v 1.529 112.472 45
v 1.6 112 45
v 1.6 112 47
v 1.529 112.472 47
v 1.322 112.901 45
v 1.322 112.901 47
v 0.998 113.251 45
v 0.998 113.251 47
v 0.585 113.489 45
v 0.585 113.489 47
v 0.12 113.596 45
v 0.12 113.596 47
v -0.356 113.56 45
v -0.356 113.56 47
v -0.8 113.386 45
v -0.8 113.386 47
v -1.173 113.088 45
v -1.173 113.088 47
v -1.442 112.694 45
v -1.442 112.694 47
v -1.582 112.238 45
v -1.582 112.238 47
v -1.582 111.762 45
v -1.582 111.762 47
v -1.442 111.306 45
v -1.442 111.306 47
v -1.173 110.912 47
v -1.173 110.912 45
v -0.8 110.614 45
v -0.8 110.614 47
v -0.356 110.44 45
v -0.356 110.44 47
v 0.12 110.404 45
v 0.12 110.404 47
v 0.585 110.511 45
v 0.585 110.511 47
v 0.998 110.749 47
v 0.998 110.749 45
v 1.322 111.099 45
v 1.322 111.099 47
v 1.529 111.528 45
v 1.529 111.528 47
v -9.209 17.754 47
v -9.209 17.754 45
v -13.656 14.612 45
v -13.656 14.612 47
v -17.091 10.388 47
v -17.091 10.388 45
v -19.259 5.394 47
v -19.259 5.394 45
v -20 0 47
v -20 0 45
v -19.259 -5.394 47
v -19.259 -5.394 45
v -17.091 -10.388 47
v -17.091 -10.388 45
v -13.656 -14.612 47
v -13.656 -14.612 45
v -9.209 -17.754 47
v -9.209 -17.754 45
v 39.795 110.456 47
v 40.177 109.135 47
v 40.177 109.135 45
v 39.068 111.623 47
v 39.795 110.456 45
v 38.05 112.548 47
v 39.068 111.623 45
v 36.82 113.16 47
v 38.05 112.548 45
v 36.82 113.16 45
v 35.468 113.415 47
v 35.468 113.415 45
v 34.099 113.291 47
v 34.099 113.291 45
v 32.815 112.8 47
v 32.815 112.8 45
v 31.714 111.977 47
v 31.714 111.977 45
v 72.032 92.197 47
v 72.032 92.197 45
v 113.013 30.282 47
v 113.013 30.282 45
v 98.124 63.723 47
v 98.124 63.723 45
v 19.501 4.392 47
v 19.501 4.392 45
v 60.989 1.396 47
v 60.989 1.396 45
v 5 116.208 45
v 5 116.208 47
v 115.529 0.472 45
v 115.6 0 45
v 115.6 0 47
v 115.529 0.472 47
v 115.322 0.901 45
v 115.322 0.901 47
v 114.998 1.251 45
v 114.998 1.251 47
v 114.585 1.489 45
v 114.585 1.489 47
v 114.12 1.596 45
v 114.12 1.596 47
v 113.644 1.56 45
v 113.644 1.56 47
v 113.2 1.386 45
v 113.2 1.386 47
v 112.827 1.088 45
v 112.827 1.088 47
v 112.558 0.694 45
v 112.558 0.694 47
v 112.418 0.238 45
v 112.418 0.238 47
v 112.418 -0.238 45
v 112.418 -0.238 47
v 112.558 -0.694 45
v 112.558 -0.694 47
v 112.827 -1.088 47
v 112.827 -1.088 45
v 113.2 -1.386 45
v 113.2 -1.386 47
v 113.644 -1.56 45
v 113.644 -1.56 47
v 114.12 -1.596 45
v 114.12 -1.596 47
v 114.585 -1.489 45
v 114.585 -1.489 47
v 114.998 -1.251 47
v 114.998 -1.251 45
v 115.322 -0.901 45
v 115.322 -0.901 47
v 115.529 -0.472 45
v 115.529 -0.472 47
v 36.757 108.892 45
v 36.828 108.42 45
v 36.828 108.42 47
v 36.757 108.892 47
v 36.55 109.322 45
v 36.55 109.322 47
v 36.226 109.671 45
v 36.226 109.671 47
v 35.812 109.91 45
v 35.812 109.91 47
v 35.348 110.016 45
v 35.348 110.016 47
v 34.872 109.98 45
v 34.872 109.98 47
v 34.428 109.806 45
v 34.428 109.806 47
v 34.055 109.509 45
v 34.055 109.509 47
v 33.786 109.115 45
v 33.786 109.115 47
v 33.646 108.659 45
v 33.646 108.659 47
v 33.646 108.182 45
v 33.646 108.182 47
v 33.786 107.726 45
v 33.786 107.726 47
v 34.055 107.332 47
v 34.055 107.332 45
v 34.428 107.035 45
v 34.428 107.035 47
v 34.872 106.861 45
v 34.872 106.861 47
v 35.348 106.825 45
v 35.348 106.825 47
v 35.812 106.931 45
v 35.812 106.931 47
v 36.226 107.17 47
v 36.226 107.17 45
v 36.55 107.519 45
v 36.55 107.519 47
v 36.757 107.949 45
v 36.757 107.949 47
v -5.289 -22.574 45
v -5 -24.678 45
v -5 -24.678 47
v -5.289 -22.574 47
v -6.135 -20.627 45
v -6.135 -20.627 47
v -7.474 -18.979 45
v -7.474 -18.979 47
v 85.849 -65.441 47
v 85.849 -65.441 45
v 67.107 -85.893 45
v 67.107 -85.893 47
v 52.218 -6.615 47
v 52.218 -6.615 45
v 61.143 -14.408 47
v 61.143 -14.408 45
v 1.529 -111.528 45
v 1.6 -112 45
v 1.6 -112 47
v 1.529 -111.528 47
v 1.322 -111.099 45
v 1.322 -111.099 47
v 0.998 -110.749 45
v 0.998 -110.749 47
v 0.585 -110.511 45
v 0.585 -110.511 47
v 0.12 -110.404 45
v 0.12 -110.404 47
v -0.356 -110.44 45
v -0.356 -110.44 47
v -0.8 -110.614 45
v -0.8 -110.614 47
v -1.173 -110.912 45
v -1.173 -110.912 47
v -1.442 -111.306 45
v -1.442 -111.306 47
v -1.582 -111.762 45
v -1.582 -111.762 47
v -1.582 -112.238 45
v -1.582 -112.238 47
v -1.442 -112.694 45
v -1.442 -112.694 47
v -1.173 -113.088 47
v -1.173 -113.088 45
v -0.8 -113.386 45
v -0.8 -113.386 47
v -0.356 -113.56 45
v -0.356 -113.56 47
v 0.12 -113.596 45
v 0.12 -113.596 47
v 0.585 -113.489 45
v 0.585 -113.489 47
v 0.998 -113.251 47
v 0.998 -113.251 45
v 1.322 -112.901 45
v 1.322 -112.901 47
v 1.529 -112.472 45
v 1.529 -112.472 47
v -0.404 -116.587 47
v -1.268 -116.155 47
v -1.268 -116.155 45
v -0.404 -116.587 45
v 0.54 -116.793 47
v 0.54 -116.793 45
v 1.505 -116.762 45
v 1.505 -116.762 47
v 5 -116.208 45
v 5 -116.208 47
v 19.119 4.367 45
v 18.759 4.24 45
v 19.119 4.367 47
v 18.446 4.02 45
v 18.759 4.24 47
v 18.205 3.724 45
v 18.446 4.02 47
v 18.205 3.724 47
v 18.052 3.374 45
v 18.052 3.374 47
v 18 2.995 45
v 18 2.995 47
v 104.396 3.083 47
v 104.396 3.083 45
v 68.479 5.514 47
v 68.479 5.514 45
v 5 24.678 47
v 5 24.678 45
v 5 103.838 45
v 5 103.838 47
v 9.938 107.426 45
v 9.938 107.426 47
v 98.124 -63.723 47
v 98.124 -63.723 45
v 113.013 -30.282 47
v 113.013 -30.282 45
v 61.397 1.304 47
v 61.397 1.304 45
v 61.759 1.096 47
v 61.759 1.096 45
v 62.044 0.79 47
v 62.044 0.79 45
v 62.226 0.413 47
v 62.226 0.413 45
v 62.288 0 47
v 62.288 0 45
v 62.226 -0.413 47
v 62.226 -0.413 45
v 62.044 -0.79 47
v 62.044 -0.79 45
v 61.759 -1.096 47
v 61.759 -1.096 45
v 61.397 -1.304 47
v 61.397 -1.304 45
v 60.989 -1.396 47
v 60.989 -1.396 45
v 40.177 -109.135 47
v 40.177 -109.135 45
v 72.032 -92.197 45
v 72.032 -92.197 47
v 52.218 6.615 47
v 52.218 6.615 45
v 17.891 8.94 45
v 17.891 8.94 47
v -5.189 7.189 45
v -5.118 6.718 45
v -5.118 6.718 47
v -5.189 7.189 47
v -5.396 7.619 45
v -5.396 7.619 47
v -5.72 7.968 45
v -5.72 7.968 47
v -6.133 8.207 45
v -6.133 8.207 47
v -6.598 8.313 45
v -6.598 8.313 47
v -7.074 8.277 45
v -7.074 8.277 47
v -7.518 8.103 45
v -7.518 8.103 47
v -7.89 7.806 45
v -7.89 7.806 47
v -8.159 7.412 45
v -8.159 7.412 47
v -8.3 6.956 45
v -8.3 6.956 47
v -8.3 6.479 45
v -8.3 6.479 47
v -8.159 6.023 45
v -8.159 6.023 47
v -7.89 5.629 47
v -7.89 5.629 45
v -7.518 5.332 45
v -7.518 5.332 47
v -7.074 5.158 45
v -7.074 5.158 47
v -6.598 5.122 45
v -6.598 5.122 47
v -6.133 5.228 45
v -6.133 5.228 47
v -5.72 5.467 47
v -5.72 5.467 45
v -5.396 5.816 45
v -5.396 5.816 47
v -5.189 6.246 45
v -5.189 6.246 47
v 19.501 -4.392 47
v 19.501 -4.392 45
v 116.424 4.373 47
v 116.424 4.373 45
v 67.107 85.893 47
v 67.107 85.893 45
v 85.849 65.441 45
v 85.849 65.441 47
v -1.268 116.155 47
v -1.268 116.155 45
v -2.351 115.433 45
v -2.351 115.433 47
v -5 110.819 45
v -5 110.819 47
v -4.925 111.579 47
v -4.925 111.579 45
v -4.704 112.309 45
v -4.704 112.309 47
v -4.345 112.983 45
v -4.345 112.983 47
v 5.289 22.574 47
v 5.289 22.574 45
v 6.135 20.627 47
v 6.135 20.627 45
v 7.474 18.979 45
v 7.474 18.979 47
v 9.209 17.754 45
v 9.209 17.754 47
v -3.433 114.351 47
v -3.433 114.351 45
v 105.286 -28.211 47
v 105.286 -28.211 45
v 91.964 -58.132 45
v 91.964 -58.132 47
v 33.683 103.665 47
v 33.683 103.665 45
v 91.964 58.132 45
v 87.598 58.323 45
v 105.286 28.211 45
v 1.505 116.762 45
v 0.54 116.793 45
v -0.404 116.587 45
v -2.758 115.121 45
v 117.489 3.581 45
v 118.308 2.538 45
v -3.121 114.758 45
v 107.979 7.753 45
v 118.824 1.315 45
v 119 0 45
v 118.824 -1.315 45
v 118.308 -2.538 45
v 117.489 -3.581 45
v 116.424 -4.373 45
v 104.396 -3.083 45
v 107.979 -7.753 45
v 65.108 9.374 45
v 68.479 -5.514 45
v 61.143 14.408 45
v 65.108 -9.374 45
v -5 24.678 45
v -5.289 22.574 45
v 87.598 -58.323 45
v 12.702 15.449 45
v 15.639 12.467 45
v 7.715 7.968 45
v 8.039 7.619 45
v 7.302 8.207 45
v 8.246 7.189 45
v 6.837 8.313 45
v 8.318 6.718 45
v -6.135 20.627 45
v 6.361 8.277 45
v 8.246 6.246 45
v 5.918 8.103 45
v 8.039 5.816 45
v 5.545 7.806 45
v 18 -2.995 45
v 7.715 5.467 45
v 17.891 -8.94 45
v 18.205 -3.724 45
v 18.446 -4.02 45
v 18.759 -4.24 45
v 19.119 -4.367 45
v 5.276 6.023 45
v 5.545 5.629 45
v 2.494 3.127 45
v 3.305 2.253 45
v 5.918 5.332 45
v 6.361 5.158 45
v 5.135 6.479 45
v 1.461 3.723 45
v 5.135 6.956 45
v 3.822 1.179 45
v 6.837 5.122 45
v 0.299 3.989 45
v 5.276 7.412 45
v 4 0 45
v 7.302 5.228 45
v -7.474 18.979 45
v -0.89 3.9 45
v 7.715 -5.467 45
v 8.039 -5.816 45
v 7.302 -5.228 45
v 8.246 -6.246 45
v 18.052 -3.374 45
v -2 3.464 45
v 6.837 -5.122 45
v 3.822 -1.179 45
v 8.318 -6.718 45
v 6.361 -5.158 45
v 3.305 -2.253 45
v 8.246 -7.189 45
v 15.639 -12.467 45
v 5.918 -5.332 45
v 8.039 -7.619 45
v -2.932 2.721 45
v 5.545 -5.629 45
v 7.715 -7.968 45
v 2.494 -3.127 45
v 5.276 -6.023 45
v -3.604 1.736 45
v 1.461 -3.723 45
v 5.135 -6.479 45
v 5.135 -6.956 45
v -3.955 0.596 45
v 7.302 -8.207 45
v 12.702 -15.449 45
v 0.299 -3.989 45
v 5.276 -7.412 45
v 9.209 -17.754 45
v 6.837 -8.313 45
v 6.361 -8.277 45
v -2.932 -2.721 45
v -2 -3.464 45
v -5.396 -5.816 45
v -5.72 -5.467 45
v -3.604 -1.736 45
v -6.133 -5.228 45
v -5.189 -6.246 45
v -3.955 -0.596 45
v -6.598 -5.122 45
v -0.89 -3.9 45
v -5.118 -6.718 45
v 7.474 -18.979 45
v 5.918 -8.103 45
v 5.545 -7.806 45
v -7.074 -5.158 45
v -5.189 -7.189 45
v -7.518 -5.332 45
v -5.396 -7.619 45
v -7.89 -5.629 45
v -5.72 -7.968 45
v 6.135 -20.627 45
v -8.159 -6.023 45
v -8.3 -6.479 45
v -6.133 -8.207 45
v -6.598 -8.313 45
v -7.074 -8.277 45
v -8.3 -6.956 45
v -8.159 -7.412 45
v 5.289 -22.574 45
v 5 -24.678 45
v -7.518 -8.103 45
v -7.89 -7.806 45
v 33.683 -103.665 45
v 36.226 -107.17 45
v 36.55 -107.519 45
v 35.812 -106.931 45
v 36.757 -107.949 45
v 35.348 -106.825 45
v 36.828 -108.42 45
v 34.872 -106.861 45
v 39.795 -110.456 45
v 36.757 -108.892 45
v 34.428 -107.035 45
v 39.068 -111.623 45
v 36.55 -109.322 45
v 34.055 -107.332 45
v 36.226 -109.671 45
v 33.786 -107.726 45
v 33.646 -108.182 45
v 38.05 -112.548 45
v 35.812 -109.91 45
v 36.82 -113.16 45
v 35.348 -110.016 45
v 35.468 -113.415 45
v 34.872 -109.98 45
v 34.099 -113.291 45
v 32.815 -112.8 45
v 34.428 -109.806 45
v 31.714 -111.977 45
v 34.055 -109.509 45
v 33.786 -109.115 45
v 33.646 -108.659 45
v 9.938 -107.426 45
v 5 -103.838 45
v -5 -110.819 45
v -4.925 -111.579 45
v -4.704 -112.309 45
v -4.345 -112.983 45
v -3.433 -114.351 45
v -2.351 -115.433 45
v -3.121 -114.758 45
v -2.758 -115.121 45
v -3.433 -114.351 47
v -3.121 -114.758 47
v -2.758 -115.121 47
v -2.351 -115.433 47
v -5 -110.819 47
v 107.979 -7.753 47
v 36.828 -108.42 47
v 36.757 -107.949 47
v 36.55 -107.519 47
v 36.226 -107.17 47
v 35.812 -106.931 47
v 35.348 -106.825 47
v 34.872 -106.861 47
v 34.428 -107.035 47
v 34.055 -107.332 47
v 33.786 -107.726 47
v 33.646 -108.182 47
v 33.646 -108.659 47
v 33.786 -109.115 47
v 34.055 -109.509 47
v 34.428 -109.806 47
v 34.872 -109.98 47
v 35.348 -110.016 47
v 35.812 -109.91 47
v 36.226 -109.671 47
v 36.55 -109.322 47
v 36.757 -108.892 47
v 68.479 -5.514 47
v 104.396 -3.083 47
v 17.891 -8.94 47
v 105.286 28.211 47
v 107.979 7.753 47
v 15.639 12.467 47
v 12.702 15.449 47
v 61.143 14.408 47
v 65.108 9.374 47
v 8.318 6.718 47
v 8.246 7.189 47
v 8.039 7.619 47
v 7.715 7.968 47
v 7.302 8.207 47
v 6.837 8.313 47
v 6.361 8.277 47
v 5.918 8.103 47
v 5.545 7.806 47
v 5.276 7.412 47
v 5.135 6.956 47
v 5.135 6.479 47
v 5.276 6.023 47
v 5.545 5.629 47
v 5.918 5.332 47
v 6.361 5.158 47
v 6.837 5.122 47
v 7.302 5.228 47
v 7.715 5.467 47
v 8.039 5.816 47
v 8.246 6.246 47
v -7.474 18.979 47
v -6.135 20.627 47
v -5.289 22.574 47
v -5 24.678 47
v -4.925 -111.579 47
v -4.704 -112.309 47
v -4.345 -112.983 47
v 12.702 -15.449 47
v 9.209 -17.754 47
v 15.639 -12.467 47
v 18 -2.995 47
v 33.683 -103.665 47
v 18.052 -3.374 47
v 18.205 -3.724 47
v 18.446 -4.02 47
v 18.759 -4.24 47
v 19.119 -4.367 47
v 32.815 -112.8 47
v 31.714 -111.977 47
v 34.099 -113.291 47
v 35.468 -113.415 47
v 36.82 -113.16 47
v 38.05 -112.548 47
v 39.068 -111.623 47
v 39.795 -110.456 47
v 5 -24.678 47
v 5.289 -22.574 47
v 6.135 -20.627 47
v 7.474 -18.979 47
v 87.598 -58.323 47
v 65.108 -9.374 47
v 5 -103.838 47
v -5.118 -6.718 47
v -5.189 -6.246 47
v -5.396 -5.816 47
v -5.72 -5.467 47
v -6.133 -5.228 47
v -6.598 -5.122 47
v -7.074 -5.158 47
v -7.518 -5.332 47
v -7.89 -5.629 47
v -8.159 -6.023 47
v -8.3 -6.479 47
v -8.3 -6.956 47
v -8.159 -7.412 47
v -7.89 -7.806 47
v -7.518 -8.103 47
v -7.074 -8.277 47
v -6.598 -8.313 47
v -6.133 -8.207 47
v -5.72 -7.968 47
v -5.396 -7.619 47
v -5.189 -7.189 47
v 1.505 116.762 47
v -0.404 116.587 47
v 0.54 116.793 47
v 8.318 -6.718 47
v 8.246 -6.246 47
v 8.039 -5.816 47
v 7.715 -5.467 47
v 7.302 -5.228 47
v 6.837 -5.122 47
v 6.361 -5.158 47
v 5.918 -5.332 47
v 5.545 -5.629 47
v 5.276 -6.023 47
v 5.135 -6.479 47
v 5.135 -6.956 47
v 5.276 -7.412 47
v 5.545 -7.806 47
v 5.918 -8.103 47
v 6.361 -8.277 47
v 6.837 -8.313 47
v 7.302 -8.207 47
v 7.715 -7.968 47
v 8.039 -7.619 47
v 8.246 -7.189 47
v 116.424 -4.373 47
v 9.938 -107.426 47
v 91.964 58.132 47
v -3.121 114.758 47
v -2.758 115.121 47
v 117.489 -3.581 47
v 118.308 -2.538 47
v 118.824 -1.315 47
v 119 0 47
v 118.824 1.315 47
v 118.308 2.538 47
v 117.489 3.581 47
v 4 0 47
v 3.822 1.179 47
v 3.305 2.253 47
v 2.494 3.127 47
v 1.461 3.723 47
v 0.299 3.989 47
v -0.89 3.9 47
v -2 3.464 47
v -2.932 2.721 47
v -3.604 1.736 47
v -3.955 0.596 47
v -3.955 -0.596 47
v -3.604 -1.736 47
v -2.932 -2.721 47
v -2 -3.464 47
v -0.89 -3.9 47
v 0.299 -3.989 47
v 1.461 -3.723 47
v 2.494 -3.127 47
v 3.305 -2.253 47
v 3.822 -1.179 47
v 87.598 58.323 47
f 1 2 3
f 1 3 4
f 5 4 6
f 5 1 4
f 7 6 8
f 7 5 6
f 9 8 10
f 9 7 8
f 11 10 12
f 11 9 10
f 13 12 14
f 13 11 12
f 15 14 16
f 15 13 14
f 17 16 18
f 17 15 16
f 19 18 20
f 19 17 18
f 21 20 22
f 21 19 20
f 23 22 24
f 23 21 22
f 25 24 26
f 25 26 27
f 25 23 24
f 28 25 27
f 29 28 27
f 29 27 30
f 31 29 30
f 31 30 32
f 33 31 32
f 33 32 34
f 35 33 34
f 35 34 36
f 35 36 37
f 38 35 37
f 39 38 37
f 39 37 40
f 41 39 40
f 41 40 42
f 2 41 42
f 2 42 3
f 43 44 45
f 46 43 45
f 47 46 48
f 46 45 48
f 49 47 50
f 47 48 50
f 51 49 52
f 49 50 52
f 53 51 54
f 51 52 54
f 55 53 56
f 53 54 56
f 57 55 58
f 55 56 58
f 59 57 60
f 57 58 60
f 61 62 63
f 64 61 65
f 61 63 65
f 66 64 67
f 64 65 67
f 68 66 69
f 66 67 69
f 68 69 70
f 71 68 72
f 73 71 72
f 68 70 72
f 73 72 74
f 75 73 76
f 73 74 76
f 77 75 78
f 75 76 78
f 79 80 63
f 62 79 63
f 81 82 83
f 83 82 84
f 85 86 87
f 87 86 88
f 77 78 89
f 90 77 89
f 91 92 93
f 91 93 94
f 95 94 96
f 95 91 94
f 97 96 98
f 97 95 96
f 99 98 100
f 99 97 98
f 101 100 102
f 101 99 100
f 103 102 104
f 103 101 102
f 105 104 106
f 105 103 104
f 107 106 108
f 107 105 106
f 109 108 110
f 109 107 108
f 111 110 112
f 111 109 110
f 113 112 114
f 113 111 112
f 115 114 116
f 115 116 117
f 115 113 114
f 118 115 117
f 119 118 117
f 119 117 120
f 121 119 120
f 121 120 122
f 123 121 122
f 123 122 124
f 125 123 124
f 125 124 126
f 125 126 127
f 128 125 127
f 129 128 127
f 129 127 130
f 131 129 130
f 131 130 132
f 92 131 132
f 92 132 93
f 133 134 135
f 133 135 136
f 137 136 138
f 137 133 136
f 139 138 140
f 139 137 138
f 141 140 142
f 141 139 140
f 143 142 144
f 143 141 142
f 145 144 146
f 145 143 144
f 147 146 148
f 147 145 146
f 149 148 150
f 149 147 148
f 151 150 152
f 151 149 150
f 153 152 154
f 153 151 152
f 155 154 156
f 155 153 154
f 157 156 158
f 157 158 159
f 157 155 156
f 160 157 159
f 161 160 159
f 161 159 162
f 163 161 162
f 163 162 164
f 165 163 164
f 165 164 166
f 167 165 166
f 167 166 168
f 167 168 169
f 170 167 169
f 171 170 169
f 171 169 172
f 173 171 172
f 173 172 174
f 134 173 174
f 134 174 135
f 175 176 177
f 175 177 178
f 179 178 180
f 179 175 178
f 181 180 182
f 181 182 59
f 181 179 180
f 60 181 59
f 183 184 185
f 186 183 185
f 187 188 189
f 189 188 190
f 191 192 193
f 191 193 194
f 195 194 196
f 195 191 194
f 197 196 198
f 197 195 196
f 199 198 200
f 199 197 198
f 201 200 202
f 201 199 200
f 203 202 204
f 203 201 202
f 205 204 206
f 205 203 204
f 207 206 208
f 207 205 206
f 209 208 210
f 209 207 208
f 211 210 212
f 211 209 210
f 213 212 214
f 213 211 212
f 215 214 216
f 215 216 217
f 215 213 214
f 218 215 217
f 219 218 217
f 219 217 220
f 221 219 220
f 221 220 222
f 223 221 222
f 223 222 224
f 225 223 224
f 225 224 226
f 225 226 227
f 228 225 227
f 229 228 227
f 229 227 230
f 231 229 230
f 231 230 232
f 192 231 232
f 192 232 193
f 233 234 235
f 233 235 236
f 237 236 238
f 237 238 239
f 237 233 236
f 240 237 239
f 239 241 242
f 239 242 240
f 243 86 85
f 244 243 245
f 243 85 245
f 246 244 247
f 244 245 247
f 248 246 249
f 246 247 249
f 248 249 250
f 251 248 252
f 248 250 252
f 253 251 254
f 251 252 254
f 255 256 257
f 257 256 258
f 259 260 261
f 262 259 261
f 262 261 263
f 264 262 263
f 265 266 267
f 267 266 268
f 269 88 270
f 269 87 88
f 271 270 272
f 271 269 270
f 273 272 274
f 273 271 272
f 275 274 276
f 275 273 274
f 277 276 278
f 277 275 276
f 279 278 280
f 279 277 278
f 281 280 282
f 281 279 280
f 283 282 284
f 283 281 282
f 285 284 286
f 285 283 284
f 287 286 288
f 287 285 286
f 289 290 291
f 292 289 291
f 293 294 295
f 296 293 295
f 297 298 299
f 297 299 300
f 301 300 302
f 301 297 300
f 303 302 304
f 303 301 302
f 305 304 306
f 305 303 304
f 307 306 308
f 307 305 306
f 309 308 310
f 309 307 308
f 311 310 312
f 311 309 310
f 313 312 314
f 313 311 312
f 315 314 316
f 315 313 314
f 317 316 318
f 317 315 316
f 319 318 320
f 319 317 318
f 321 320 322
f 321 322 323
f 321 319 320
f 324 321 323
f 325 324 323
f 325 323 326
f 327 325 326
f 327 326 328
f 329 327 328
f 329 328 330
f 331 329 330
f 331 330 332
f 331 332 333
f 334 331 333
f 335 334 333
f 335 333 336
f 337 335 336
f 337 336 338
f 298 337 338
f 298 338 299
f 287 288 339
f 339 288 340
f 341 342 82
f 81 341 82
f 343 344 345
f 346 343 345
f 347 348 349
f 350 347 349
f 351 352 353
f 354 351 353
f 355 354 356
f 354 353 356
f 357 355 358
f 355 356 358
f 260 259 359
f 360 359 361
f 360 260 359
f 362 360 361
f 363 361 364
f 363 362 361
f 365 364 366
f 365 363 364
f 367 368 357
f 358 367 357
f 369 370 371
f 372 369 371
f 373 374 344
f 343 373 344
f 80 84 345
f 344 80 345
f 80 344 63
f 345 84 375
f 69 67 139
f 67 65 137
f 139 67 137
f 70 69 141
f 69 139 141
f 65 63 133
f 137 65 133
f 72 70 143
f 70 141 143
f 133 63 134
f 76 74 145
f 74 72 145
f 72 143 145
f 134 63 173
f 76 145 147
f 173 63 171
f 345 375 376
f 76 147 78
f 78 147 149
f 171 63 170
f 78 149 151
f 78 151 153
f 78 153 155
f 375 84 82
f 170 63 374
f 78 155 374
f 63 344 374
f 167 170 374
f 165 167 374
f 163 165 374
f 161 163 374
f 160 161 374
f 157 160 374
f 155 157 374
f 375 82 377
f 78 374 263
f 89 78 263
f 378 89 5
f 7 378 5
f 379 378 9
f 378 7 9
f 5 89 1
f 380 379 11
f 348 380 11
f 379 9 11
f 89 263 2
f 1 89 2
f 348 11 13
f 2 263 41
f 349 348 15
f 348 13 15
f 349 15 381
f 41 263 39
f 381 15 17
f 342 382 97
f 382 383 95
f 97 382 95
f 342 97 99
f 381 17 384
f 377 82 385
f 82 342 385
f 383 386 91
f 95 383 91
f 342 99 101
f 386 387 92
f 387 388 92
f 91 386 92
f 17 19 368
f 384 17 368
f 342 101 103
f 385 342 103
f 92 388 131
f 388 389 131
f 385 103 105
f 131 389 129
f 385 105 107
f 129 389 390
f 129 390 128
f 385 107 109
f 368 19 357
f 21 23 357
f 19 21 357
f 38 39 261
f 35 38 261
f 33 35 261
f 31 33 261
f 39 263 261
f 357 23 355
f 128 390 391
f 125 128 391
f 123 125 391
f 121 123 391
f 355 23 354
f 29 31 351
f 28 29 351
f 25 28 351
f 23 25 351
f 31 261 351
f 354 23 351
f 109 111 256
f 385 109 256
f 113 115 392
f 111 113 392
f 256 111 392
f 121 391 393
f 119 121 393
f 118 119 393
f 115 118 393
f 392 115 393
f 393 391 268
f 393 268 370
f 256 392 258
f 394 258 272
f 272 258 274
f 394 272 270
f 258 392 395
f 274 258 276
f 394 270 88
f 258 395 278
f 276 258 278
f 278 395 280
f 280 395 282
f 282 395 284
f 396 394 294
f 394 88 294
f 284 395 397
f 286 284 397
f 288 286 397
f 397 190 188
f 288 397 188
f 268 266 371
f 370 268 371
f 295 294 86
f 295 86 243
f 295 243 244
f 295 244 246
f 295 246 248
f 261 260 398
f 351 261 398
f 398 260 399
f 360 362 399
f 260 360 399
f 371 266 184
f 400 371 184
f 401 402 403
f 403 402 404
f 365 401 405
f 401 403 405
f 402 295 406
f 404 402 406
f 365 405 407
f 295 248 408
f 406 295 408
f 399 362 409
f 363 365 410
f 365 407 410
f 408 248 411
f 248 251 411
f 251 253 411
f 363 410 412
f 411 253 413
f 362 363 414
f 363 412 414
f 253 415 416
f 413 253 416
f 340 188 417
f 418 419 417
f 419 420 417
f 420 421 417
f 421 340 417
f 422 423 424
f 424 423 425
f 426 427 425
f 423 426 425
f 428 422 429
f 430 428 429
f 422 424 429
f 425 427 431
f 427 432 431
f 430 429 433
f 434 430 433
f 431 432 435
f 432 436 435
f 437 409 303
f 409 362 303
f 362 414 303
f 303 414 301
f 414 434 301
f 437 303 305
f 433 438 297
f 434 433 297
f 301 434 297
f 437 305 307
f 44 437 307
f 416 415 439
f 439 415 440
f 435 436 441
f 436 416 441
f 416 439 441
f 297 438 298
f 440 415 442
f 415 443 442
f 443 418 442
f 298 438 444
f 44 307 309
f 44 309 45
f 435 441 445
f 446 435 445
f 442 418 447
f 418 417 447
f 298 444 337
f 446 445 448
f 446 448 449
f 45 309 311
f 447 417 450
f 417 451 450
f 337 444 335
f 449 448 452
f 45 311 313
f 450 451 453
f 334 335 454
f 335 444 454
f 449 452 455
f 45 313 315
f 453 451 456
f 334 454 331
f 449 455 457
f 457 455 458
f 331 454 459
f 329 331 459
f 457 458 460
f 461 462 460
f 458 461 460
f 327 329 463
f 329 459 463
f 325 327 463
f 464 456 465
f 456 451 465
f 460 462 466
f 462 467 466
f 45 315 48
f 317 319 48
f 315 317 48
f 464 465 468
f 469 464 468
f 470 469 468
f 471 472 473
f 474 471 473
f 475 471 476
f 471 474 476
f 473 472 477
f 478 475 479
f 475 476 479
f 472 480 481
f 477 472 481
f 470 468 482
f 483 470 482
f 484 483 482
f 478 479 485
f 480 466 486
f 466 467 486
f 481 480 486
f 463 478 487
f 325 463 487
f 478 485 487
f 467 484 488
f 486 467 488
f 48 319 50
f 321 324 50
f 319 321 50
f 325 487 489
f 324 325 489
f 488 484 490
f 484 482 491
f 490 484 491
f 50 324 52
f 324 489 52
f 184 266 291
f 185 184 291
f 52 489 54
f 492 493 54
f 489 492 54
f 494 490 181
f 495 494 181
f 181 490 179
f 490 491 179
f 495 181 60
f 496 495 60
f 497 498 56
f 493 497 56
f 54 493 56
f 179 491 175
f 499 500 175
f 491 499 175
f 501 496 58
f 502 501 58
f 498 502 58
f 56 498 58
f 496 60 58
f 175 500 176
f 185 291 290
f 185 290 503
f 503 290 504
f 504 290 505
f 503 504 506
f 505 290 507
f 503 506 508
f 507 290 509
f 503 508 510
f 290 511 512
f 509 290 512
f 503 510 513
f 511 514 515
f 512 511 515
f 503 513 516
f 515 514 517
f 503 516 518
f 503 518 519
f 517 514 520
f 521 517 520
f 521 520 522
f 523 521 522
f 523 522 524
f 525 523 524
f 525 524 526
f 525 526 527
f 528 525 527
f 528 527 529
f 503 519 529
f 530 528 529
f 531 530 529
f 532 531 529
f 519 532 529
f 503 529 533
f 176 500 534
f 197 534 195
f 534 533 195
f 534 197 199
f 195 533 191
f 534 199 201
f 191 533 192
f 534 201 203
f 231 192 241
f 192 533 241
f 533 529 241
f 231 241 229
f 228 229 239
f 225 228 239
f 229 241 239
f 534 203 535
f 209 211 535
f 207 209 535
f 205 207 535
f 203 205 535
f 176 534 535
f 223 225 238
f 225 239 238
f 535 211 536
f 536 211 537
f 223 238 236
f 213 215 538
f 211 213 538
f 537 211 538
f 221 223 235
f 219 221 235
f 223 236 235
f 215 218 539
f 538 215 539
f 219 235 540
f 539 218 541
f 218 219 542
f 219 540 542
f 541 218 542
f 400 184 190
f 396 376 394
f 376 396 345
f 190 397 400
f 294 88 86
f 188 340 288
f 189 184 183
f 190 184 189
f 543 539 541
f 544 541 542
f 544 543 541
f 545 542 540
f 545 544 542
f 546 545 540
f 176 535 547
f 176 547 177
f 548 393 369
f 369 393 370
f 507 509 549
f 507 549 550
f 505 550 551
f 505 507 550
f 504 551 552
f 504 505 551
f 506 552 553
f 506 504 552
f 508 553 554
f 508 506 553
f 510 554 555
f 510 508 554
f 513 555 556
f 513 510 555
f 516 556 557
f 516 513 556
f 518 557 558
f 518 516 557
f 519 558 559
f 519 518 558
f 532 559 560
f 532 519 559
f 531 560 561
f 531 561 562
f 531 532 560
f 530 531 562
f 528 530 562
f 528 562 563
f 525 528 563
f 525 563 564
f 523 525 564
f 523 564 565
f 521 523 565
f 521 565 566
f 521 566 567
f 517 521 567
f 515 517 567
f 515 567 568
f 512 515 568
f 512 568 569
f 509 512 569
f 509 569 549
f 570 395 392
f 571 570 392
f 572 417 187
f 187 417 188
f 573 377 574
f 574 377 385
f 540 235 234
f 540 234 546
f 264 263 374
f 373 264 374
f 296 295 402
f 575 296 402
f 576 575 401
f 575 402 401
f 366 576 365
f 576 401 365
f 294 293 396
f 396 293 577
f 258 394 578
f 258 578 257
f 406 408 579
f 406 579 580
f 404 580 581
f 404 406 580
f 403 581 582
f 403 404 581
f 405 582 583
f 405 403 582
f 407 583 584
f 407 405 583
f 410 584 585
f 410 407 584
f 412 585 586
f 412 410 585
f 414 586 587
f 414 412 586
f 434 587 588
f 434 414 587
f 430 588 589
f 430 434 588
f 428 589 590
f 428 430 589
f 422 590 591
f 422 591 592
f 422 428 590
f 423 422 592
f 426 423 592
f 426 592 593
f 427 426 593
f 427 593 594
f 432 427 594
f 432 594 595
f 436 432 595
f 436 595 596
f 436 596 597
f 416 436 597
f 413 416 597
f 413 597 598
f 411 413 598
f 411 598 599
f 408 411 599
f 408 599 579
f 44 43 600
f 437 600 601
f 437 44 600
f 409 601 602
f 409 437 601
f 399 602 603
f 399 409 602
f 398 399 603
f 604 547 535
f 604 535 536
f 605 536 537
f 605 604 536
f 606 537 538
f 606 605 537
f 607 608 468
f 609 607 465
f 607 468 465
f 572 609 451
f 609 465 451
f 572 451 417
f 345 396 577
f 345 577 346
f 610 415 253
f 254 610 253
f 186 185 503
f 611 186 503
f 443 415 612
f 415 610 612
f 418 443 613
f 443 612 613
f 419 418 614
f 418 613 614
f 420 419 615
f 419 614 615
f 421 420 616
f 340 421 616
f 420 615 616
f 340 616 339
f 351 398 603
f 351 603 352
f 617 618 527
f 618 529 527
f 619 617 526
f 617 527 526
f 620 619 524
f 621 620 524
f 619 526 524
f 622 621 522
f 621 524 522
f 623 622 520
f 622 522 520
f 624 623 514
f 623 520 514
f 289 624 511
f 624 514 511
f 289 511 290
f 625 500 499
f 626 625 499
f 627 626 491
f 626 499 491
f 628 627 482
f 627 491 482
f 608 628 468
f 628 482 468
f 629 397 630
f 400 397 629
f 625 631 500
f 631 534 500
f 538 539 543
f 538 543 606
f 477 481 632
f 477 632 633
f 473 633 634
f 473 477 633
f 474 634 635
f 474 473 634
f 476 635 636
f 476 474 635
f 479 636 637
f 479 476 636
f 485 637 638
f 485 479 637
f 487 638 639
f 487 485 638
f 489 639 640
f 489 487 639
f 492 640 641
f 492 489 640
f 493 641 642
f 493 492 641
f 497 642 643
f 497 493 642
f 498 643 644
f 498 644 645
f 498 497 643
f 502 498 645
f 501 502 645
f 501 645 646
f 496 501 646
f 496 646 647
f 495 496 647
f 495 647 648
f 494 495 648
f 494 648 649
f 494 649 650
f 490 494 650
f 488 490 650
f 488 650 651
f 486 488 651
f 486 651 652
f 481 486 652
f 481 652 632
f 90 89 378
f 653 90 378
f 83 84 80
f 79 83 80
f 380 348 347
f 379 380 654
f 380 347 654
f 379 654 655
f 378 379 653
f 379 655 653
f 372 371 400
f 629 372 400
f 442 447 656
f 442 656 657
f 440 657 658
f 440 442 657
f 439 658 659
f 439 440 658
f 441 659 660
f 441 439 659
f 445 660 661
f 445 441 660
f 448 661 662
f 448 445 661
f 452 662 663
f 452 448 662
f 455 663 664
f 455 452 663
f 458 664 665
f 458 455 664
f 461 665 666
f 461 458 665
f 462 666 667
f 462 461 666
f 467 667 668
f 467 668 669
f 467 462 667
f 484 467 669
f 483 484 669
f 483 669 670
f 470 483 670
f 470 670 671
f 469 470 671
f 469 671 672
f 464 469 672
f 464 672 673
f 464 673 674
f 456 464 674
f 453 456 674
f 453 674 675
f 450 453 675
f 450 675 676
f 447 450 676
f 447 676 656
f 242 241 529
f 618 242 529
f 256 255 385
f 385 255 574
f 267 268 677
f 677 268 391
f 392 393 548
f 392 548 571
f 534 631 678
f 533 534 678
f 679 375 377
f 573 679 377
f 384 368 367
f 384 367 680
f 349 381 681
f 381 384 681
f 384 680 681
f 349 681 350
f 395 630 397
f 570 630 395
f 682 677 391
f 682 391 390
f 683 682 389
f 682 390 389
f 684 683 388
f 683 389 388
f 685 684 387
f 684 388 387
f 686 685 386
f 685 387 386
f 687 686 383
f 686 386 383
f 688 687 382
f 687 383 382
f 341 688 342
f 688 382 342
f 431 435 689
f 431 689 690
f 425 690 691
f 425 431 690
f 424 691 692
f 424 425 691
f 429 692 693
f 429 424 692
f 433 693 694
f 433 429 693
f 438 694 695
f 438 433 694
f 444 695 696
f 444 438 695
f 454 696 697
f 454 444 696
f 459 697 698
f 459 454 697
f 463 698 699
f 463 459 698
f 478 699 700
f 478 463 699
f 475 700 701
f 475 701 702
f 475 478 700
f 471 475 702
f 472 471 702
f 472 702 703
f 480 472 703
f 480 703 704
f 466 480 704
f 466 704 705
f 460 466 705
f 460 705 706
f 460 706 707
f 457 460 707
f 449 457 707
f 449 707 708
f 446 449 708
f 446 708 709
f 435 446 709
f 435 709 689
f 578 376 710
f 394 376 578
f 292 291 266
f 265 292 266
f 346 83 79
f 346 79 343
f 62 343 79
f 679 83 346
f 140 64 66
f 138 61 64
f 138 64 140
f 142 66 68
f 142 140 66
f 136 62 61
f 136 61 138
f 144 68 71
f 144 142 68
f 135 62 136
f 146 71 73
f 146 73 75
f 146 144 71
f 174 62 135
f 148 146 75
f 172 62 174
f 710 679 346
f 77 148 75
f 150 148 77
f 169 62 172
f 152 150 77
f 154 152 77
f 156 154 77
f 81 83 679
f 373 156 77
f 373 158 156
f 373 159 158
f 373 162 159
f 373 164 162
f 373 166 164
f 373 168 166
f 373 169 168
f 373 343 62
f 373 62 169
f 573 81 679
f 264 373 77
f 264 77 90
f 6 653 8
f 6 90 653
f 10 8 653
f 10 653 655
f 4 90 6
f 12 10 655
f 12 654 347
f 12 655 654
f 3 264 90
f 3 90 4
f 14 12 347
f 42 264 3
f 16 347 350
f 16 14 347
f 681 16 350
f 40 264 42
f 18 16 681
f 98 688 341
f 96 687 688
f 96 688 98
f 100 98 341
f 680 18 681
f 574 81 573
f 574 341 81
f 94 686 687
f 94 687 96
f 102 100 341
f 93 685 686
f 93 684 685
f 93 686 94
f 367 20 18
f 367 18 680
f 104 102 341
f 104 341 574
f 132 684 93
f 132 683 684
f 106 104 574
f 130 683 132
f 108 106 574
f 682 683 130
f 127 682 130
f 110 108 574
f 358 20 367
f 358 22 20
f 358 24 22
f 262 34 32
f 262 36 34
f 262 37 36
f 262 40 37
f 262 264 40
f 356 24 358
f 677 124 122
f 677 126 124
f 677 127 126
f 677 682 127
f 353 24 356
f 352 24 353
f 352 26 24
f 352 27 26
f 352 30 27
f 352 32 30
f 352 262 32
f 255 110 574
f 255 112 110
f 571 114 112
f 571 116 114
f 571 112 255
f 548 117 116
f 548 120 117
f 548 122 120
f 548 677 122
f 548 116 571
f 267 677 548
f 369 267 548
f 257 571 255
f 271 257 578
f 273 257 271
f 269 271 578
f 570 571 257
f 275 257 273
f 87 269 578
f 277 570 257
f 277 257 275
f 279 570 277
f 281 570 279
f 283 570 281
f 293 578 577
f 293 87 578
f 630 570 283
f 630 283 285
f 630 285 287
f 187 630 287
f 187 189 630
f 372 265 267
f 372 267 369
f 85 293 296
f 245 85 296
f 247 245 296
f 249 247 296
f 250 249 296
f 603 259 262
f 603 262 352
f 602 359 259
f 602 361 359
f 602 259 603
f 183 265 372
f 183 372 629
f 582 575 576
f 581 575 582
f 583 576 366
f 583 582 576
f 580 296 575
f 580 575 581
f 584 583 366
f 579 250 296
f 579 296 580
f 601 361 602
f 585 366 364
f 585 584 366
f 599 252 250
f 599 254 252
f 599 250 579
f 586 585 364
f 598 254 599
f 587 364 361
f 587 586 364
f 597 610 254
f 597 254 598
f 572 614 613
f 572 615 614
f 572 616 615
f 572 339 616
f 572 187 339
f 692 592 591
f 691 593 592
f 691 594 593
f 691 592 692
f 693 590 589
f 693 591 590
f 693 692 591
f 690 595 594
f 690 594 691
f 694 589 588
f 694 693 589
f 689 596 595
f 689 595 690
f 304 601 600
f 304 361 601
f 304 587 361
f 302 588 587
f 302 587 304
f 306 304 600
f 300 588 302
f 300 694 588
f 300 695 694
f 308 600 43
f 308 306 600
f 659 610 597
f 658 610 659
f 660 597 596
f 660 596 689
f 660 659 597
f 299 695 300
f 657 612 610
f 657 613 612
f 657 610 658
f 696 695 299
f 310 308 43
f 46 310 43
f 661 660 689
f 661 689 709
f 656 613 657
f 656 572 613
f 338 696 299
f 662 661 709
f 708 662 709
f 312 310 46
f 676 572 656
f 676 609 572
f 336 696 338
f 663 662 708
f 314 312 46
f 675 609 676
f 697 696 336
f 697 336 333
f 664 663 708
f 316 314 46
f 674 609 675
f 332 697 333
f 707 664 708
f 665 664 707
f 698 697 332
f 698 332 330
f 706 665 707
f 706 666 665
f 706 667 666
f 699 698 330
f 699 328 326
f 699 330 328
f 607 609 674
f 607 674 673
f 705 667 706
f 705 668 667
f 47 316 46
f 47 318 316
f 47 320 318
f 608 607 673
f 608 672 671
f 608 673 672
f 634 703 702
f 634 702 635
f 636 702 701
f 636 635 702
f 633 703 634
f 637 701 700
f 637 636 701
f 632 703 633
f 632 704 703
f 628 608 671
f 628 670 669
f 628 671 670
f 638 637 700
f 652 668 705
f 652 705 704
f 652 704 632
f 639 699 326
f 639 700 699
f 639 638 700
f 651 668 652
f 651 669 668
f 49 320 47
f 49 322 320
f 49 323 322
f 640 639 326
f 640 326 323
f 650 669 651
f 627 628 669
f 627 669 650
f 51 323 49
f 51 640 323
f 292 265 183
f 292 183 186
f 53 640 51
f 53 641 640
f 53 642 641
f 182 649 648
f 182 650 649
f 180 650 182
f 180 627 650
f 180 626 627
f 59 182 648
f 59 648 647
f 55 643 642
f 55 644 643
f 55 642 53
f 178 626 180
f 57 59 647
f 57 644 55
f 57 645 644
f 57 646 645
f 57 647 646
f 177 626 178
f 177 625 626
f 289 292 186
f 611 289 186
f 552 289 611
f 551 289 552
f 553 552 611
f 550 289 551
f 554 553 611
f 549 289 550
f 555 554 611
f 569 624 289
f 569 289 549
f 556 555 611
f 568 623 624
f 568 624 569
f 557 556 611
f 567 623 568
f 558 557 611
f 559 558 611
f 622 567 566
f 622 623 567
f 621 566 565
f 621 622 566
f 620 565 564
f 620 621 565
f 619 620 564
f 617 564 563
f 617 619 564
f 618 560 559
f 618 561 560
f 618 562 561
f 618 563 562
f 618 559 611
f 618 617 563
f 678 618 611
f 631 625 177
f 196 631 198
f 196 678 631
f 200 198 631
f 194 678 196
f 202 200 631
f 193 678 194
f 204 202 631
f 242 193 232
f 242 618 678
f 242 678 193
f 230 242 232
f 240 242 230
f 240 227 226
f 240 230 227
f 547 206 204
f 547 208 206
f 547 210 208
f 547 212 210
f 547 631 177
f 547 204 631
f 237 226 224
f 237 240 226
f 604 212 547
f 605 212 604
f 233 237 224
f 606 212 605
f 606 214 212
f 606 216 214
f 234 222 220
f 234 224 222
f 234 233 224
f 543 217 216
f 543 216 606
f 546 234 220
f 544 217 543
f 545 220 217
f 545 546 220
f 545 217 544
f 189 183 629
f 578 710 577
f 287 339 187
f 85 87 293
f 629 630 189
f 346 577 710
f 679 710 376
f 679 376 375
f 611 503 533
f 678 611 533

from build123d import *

# Parameters (mm, degrees)
EXTRUDE_180_DEPTH      = 8
EXTRUDE_START          = 8
SKETCH_2_W             = 6
SKETCH_2_H             = 4
EXTRUDE_456_DEPTH      = 36
EXTRUDE_START_2        = 44
EXTRUDE_180_2_DEPTH    = 3
SKETCH_4_R             = 20
SKETCH_4_R_2           = 4
EXTRUDE_691_DEPTH      = 3
EXTRUDE_744_DEPTH      = 3
SKETCH_6_W             = 10
SKETCH_6_H             = 96
EXTRUDE_1_DEPTH        = 3
EXTRUDE_Y_1_DEPTH      = 3
SKETCH_8_W             = 10
SKETCH_8_H             = 96
EXTRUDE_1_2_DEPTH      = 3
EXTRUDE_Y_1_2_DEPTH    = 3
CUT_EXTRUDE_START      = 44
CUT_EXTRUDE_1136_DEPTH = 3
EXTRUDE_1227_DEPTH     = 3
SKETCH_12_R            = 5
EXTRUDE_1296_DEPTH     = 8
SKETCH_13_R            = 1.6
CUT_EXTRUDE_1367_DEPTH = 3
SKETCH_14_R            = 1.6
CUT_EXTRUDE_1428_DEPTH = 8
SKETCH_15_W            = 600
SKETCH_15_H            = 600
CUT_EXTRUDE_1488_DEPTH = 44
F_2MM_START            = 44
F_2MM_DEPTH            = 3
SKETCH_17_R            = 5
EXTRUDE_M3_DEPTH       = 3
SKETCH_18_R            = 5
EXTRUDE_3_DEPTH        = 3
SKETCH_19_R            = 5
EXTRUDE_4_DEPTH        = 3
SKETCH_20_R            = 1.6
CUT_EXTRUDE_M3_DEPTH   = 3
R7P8_75_R              = 7.8
R3P9_R                 = 3.9
F_2MM_45_47_START      = 44
SKETCH_21_W            = 600
SKETCH_21_H            = 600
F_2MM_45_47_DEPTH      = 1
FILLET_1_R             = 1.4
CHAMFER_1_SIZE         = 5
CHAMFER_1_SIZE_2       = 4.246045496
CHAMFER_1_SIZE_3       = 3.817956769
CHAMFER_1_SIZE_4       = 4.370160244
CHAMFER_1_SIZE_5       = 3.876090347
CHAMFER_1_SIZE_6       = 9.033398393


with BuildPart() as part:
    # 草图1 → Extrude 180 (new body)
    with BuildSketch(Plane.XY):
        Polygon((0, -115), (35.536954353, -109.371499374), (70.801069662, -90.621236665), (96.447115314, -62.633489027), (111.081470023, -29.764190187), (115, 0), (111.081470023, 29.764190187), (96.447115314, 62.633489027), (70.801069662, 90.621236665), (35.536954353, 109.371499374), (0, 115), (0, 111), (34.300886376, 105.567273309), (68.338423761, 87.46919365), (93.092433042, 60.454932887), (107.217766718, 28.728914006), (111, 0), (107.217766718, -28.728914006), (93.092433042, -60.454932887), (68.338423761, -87.46919365), (34.300886376, -105.567273309), (0, -111), align=None)
    extrude(amount=EXTRUDE_180_DEPTH)

    # 草图2 → Extrude 456 (add)
    with BuildSketch(Plane.XY.offset(EXTRUDE_START)):
        Polygon((35.584965419, -103.047126287), (37.439067386, -108.753465385), (33.634841321, -109.989533363), (31.780739354, -104.283194265), align=None)
        with Locations((112, 0)):
            Rectangle(SKETCH_2_W, SKETCH_2_H)
        Polygon((31.780739354, 104.283194265), (33.634841321, 109.989533363), (37.439067386, 108.753465385), (35.584965419, 103.047126287), align=None)
    extrude(amount=EXTRUDE_456_DEPTH)

    # 草图3 → Extrude 180 2 (add)
    with BuildSketch(Plane.XY.offset(EXTRUDE_START_2)):
        Polygon((0, -115), (35.536954353, -109.371499374), (70.801069662, -90.621236665), (96.447115314, -62.633489027), (111.081470023, -29.764190187), (115, 0), (111.081470023, 29.764190187), (96.447115314, 62.633489027), (70.801069662, 90.621236665), (35.536954353, 109.371499374), (0, 115), (0, 109), (33.682852387, 103.665160276), (67.10710081, 85.893172143), (91.415091906, 59.365654817), (105.285915066, 28.211275916), (109, 0), (105.285915066, -28.211275916), (91.415091906, -59.365654817), (67.10710081, -85.893172143), (33.682852387, -103.665160276), (0, -109), align=None)
    extrude(amount=EXTRUDE_180_2_DEPTH)



with BuildPart() as body_2:
    # 草图4 → Extrude 691 (new body)
    with BuildSketch(Plane.XY.offset(EXTRUDE_START_2)):
        Circle(SKETCH_4_R)
        Circle(SKETCH_4_R_2, mode=Mode.SUBTRACT)
    extrude(amount=EXTRUDE_691_DEPTH)


with BuildPart() as part_1:
    add(part.part)

    add(body_2.part)  # Extrude 744 merges body 2
    # 草图5 → Extrude 744 (add)
    with BuildSketch(Plane.XY.offset(EXTRUDE_START_2)):
        Polygon((17, -9), (113, -2.5), (113, 2.5), (17, 9), align=None)
    extrude(amount=EXTRUDE_744_DEPTH)

    # 草图6 → Extrude 1 (add)
    with BuildSketch(Plane.XY.offset(EXTRUDE_START_2)):
        with Locations((0, -64)):
            Rectangle(SKETCH_6_W, SKETCH_6_H)
    extrude(amount=EXTRUDE_1_DEPTH)

    # 草图7 → Extrude Y__-1 (add)
    with BuildSketch(Plane.XY.offset(EXTRUDE_START_2)):
        Polygon((60.213265383, 1.279918343), (91.234949037, -66.240061243), (87.165050963, -68.159938757), (54.786734617, -1.279918343), align=None)
    extrude(amount=EXTRUDE_Y_1_DEPTH)

    # 草图8 → Extrude 1 2 (add)
    with BuildSketch(Plane.XY.offset(EXTRUDE_START_2)):
        with Locations((0, 64)):
            Rectangle(SKETCH_8_W, SKETCH_8_H)
    extrude(amount=EXTRUDE_1_2_DEPTH)

    # 草图9 → Extrude Y__1 2 (add)
    with BuildSketch(Plane.XY.offset(EXTRUDE_START_2)):
        Polygon((54.786734617, 1.279918343), (87.165050963, 68.159938757), (91.234949037, 66.240061243), (60.213265383, -1.279918343), align=None)
    extrude(amount=EXTRUDE_Y_1_2_DEPTH)

    # 草图10 → Cut-Extrude 1136 (cut)
    with BuildSketch(Plane.XY.offset(CUT_EXTRUDE_START)):
        Polygon((18, -4.5), (18, 4.5), (80.33, 0), align=None)
    extrude(amount=CUT_EXTRUDE_1136_DEPTH, mode=Mode.SUBTRACT)

    # 草图11 → Extrude 1227 (add)
    with BuildSketch(Plane.XY.offset(EXTRUDE_START_2)):
        Polygon((-5, -107), (5, -107), (5, -116.208077798), (0, -117), (-3, -115), (-5, -112), align=None)
        Polygon((-5, 107), (5, 107), (5, 116.208077798), (0, 117), (-3, 115), (-5, 112), align=None)
    extrude(amount=EXTRUDE_1227_DEPTH)

    # 草图12 → Extrude 1296 (add)
    with BuildSketch(Plane.XY):
        with Locations((0, 112)):
            Circle(SKETCH_12_R)
        with Locations((0, -112)):
            Circle(SKETCH_12_R)
    extrude(amount=EXTRUDE_1296_DEPTH)

    # 草图13 → Cut-Extrude 1367 (cut)
    with BuildSketch(Plane.XY.offset(CUT_EXTRUDE_START)):
        with Locations((0, 112)):
            Circle(SKETCH_13_R)
        with Locations((0, -112)):
            Circle(SKETCH_13_R)
        with Locations((-6.717514421, -6.717514421)):
            Circle(SKETCH_13_R)
        with Locations((-6.717514421, 6.717514421)):
            Circle(SKETCH_13_R)
        with Locations((6.717514421, -6.717514421)):
            Circle(SKETCH_13_R)
        with Locations((6.717514421, 6.717514421)):
            Circle(SKETCH_13_R)
    extrude(amount=CUT_EXTRUDE_1367_DEPTH, mode=Mode.SUBTRACT)

    # 草图14 → Cut-Extrude 1428 (cut)
    with BuildSketch(Plane.XY):
        with Locations((0, 112)):
            Circle(SKETCH_14_R)
        with Locations((0, -112)):
            Circle(SKETCH_14_R)
    extrude(amount=CUT_EXTRUDE_1428_DEPTH, mode=Mode.SUBTRACT)

    # 草图15 → Cut-Extrude 1488 (cut)
    with BuildSketch(Plane.XY):
        Rectangle(SKETCH_15_W, SKETCH_15_H)
    extrude(amount=CUT_EXTRUDE_1488_DEPTH, mode=Mode.SUBTRACT)

    # 草图16 → 外圈径向加厚2mm (add)
    with BuildSketch(Plane.XY.offset(F_2MM_START)):
        Polygon((0, -117), (36.154988342, -111.273612407), (72.032392613, -92.197258172), (98.12445645, -63.722767097), (113.013321676, -30.281828277), (117, 0), (113.013321676, 30.281828277), (98.12445645, 63.722767097), (72.032392613, 92.197258172), (36.154988342, 111.273612407), (0, 117), (0, 114), (35.227937359, 108.420442858), (70.185408187, 89.833225911), (95.608444746, 62.088849992), (110.115544197, 29.505371142), (114, 0), (110.115544197, -29.505371142), (95.608444746, -62.088849992), (70.185408187, -89.833225911), (35.227937359, -108.420442858), (0, -114), align=None)
    extrude(amount=F_2MM_DEPTH)

    # 草图17 → M3铝柱上定位耳 (add)
    with BuildSketch(Plane.XY.offset(EXTRUDE_START_2)):
        with Locations((35.227937359, -108.420442858)):
            Circle(SKETCH_17_R)
    extrude(amount=EXTRUDE_M3_DEPTH)

    # 草图18 → 凸台-拉伸3 (add)
    with BuildSketch(Plane.XY.offset(EXTRUDE_START_2)):
        with Locations((114, 0)):
            Circle(SKETCH_18_R)
    extrude(amount=EXTRUDE_3_DEPTH)

    # 草图19 → 凸台-拉伸4 (add)
    with BuildSketch(Plane.XY.offset(EXTRUDE_START_2)):
        with Locations((35.227937359, 108.420442858)):
            Circle(SKETCH_19_R)
    extrude(amount=EXTRUDE_4_DEPTH)

    # 草图20 → 三处M3上层固定孔 (cut)
    with BuildSketch(Plane.XY.offset(CUT_EXTRUDE_START)):
        with Locations((35.227937359, -108.420442858)):
            Circle(SKETCH_20_R)
        with Locations((114, 0)):
            Circle(SKETCH_20_R)
        with Locations((35.227937359, 108.420442858)):
            Circle(SKETCH_20_R)
    extrude(amount=CUT_EXTRUDE_M3_DEPTH, mode=Mode.SUBTRACT)

    # 外侧梁根部圆角_R7p8_参考75度桨保
    r7p8_75_edges = [part_1.edges().sort_by_distance(p)[0] for p in [
        (5, -19.364916731, 45.5),
        (-5, -19.364916731, 45.5),
        (-5, 19.364916731, 45.5),
        (5, 19.364916731, 45.5),
    ]]
    fillet(r7p8_75_edges, radius=R7P8_75_R)

    # 端耳外缘圆角_R3p9_轮廓内收
    r3p9_edges = [part_1.edges().sort_by_distance(p)[0] for p in [
        (-5, -112, 45.5),
        (-5, 112, 45.5),
        (-3, -115, 45.5),
        (0, -117, 45.5),
        (0, 117, 45.5),
        (-3, 115, 45.5),
    ]]
    fillet(r3p9_edges, radius=R3P9_R)

    # 草图21 → 统一2mm板厚_上层保留45至47 (cut)
    with BuildSketch(Plane.XY.offset(F_2MM_45_47_START)):
        Rectangle(SKETCH_21_W, SKETCH_21_H)
    extrude(amount=F_2MM_45_47_DEPTH, mode=Mode.SUBTRACT)

    # 圆角1
    fillet_1_edges = [part_1.edges().sort_by_distance(p)[0] for p in [
        (18, -4.5, 46),
        (80.33, 0, 46),
        (18, 4.5, 46),
    ]]
    fillet(fillet_1_edges, radius=FILLET_1_R)

    # 倒角1
    # the kernel refuses this chamfer: 9.033398393, 5, 4.370160244, 4.246045496, 3.876090347, 3.817956769 mm, written as the material it adds along each edge
    with BuildSketch(Plane(origin=(108.631931923, -2.795754609, 45), x_dir=(-0.10321619689960815, -0.9946589449140752, 0), z_dir=(0, 0, 1))) as chamfer_1_piece_1:
        Polygon((CHAMFER_1_SIZE * 0.999621916911, -CHAMFER_1_SIZE * 0.0274958766106), (CHAMFER_1_SIZE_2 * 0.17017326961, -CHAMFER_1_SIZE_2 * 0.985414155772), (0, 0), align=None)
    extrude(amount=2)
    with BuildSketch(Plane(origin=(108.631931923, 2.795754609, 47), x_dir=(-0.9995678495067102, 0.02939581998398161, 0), z_dir=(0, 0, -1))) as chamfer_1_piece_2:
        Polygon((CHAMFER_1_SIZE_2 * 0.999270274205, CHAMFER_1_SIZE_2 * 0.0381958005112), (CHAMFER_1_SIZE * 0.159614119931, CHAMFER_1_SIZE * 0.987179483538), (0, 0), align=None)
    extrude(amount=2)
    with BuildSketch(Plane(origin=(89.191460159, -61.792323046, 45), x_dir=(0.6956068650639778, 0.7184226397294735, 0), z_dir=(0, 0, 1))) as chamfer_1_piece_3:
        Polygon((CHAMFER_1_SIZE * 0.999621916911, CHAMFER_1_SIZE * 0.0274958766106), (CHAMFER_1_SIZE_3 * 0.36240953925, CHAMFER_1_SIZE_3 * 0.932018951466), (0, 0), align=None)
    extrude(amount=2)
    with BuildSketch(Plane(origin=(89.191460159, 61.792323046, 47), x_dir=(-0.4601932489228402, -0.8878187729744403, 0), z_dir=(0, 0, -1))) as chamfer_1_piece_4:
        Polygon((CHAMFER_1_SIZE_3 * 0.998870534427, -CHAMFER_1_SIZE_3 * 0.0475147922669), (CHAMFER_1_SIZE * 0.343666607926, -CHAMFER_1_SIZE * 0.939091722143), (0, 0), align=None)
    extrude(amount=2)
    with BuildSketch(Plane(origin=(5, -108.208077798, 47), x_dir=(-0.03603131014618112, 0.9993506615243469, 0), z_dir=(0, 0, -1)), Plane(origin=(5, 108.208077798, 45), x_dir=(-0.0360313101461817, -0.9993506615243467, 0), z_dir=(0, 0, 1))) as chamfer_1_piece_5:
        Polygon((CHAMFER_1_SIZE_4 * 0.999350661636, CHAMFER_1_SIZE_4 * 0.0360313101502), (CHAMFER_1_SIZE * 0.120745181195, CHAMFER_1_SIZE * 0.992683535281), (0, 0), align=None)
    extrude(amount=2)
    with BuildSketch(Plane(origin=(63.490093255, 5.852233269, 45), x_dir=(0.37520935392057214, 0.9269400955458269, 0), z_dir=(0, 0, 1)), Plane(origin=(63.490093255, -5.852233269, 47), x_dir=(0.37520935392056365, -0.9269400955458303, 0), z_dir=(0, 0, -1))) as chamfer_1_piece_6:
        Polygon((CHAMFER_1_SIZE_5 * 0.998939538699, -CHAMFER_1_SIZE_5 * 0.0460412632699), (CHAMFER_1_SIZE * 0.311734042399, -CHAMFER_1_SIZE * 0.950169399007), (0, 0), align=None)
    extrude(amount=2)
    with BuildSketch(Plane(origin=(57.2062873, -6.277699297, 45), x_dir=(-0.9998189901573707, -0.0190259538708392, 0), z_dir=(0, 0, 1)), Plane(origin=(57.2062873, 6.277699297, 47), x_dir=(-0.9998189901573707, 0.019025953870838982, 0), z_dir=(0, 0, -1))) as chamfer_1_piece_7:
        Polygon((CHAMFER_1_SIZE * 0.998820318674, CHAMFER_1_SIZE * 0.0485589436086), (-CHAMFER_1_SIZE_6 * 0.418542922597, CHAMFER_1_SIZE_6 * 0.908197017112), (0, 0), align=None)
    extrude(amount=2)


solid = part_1.part
